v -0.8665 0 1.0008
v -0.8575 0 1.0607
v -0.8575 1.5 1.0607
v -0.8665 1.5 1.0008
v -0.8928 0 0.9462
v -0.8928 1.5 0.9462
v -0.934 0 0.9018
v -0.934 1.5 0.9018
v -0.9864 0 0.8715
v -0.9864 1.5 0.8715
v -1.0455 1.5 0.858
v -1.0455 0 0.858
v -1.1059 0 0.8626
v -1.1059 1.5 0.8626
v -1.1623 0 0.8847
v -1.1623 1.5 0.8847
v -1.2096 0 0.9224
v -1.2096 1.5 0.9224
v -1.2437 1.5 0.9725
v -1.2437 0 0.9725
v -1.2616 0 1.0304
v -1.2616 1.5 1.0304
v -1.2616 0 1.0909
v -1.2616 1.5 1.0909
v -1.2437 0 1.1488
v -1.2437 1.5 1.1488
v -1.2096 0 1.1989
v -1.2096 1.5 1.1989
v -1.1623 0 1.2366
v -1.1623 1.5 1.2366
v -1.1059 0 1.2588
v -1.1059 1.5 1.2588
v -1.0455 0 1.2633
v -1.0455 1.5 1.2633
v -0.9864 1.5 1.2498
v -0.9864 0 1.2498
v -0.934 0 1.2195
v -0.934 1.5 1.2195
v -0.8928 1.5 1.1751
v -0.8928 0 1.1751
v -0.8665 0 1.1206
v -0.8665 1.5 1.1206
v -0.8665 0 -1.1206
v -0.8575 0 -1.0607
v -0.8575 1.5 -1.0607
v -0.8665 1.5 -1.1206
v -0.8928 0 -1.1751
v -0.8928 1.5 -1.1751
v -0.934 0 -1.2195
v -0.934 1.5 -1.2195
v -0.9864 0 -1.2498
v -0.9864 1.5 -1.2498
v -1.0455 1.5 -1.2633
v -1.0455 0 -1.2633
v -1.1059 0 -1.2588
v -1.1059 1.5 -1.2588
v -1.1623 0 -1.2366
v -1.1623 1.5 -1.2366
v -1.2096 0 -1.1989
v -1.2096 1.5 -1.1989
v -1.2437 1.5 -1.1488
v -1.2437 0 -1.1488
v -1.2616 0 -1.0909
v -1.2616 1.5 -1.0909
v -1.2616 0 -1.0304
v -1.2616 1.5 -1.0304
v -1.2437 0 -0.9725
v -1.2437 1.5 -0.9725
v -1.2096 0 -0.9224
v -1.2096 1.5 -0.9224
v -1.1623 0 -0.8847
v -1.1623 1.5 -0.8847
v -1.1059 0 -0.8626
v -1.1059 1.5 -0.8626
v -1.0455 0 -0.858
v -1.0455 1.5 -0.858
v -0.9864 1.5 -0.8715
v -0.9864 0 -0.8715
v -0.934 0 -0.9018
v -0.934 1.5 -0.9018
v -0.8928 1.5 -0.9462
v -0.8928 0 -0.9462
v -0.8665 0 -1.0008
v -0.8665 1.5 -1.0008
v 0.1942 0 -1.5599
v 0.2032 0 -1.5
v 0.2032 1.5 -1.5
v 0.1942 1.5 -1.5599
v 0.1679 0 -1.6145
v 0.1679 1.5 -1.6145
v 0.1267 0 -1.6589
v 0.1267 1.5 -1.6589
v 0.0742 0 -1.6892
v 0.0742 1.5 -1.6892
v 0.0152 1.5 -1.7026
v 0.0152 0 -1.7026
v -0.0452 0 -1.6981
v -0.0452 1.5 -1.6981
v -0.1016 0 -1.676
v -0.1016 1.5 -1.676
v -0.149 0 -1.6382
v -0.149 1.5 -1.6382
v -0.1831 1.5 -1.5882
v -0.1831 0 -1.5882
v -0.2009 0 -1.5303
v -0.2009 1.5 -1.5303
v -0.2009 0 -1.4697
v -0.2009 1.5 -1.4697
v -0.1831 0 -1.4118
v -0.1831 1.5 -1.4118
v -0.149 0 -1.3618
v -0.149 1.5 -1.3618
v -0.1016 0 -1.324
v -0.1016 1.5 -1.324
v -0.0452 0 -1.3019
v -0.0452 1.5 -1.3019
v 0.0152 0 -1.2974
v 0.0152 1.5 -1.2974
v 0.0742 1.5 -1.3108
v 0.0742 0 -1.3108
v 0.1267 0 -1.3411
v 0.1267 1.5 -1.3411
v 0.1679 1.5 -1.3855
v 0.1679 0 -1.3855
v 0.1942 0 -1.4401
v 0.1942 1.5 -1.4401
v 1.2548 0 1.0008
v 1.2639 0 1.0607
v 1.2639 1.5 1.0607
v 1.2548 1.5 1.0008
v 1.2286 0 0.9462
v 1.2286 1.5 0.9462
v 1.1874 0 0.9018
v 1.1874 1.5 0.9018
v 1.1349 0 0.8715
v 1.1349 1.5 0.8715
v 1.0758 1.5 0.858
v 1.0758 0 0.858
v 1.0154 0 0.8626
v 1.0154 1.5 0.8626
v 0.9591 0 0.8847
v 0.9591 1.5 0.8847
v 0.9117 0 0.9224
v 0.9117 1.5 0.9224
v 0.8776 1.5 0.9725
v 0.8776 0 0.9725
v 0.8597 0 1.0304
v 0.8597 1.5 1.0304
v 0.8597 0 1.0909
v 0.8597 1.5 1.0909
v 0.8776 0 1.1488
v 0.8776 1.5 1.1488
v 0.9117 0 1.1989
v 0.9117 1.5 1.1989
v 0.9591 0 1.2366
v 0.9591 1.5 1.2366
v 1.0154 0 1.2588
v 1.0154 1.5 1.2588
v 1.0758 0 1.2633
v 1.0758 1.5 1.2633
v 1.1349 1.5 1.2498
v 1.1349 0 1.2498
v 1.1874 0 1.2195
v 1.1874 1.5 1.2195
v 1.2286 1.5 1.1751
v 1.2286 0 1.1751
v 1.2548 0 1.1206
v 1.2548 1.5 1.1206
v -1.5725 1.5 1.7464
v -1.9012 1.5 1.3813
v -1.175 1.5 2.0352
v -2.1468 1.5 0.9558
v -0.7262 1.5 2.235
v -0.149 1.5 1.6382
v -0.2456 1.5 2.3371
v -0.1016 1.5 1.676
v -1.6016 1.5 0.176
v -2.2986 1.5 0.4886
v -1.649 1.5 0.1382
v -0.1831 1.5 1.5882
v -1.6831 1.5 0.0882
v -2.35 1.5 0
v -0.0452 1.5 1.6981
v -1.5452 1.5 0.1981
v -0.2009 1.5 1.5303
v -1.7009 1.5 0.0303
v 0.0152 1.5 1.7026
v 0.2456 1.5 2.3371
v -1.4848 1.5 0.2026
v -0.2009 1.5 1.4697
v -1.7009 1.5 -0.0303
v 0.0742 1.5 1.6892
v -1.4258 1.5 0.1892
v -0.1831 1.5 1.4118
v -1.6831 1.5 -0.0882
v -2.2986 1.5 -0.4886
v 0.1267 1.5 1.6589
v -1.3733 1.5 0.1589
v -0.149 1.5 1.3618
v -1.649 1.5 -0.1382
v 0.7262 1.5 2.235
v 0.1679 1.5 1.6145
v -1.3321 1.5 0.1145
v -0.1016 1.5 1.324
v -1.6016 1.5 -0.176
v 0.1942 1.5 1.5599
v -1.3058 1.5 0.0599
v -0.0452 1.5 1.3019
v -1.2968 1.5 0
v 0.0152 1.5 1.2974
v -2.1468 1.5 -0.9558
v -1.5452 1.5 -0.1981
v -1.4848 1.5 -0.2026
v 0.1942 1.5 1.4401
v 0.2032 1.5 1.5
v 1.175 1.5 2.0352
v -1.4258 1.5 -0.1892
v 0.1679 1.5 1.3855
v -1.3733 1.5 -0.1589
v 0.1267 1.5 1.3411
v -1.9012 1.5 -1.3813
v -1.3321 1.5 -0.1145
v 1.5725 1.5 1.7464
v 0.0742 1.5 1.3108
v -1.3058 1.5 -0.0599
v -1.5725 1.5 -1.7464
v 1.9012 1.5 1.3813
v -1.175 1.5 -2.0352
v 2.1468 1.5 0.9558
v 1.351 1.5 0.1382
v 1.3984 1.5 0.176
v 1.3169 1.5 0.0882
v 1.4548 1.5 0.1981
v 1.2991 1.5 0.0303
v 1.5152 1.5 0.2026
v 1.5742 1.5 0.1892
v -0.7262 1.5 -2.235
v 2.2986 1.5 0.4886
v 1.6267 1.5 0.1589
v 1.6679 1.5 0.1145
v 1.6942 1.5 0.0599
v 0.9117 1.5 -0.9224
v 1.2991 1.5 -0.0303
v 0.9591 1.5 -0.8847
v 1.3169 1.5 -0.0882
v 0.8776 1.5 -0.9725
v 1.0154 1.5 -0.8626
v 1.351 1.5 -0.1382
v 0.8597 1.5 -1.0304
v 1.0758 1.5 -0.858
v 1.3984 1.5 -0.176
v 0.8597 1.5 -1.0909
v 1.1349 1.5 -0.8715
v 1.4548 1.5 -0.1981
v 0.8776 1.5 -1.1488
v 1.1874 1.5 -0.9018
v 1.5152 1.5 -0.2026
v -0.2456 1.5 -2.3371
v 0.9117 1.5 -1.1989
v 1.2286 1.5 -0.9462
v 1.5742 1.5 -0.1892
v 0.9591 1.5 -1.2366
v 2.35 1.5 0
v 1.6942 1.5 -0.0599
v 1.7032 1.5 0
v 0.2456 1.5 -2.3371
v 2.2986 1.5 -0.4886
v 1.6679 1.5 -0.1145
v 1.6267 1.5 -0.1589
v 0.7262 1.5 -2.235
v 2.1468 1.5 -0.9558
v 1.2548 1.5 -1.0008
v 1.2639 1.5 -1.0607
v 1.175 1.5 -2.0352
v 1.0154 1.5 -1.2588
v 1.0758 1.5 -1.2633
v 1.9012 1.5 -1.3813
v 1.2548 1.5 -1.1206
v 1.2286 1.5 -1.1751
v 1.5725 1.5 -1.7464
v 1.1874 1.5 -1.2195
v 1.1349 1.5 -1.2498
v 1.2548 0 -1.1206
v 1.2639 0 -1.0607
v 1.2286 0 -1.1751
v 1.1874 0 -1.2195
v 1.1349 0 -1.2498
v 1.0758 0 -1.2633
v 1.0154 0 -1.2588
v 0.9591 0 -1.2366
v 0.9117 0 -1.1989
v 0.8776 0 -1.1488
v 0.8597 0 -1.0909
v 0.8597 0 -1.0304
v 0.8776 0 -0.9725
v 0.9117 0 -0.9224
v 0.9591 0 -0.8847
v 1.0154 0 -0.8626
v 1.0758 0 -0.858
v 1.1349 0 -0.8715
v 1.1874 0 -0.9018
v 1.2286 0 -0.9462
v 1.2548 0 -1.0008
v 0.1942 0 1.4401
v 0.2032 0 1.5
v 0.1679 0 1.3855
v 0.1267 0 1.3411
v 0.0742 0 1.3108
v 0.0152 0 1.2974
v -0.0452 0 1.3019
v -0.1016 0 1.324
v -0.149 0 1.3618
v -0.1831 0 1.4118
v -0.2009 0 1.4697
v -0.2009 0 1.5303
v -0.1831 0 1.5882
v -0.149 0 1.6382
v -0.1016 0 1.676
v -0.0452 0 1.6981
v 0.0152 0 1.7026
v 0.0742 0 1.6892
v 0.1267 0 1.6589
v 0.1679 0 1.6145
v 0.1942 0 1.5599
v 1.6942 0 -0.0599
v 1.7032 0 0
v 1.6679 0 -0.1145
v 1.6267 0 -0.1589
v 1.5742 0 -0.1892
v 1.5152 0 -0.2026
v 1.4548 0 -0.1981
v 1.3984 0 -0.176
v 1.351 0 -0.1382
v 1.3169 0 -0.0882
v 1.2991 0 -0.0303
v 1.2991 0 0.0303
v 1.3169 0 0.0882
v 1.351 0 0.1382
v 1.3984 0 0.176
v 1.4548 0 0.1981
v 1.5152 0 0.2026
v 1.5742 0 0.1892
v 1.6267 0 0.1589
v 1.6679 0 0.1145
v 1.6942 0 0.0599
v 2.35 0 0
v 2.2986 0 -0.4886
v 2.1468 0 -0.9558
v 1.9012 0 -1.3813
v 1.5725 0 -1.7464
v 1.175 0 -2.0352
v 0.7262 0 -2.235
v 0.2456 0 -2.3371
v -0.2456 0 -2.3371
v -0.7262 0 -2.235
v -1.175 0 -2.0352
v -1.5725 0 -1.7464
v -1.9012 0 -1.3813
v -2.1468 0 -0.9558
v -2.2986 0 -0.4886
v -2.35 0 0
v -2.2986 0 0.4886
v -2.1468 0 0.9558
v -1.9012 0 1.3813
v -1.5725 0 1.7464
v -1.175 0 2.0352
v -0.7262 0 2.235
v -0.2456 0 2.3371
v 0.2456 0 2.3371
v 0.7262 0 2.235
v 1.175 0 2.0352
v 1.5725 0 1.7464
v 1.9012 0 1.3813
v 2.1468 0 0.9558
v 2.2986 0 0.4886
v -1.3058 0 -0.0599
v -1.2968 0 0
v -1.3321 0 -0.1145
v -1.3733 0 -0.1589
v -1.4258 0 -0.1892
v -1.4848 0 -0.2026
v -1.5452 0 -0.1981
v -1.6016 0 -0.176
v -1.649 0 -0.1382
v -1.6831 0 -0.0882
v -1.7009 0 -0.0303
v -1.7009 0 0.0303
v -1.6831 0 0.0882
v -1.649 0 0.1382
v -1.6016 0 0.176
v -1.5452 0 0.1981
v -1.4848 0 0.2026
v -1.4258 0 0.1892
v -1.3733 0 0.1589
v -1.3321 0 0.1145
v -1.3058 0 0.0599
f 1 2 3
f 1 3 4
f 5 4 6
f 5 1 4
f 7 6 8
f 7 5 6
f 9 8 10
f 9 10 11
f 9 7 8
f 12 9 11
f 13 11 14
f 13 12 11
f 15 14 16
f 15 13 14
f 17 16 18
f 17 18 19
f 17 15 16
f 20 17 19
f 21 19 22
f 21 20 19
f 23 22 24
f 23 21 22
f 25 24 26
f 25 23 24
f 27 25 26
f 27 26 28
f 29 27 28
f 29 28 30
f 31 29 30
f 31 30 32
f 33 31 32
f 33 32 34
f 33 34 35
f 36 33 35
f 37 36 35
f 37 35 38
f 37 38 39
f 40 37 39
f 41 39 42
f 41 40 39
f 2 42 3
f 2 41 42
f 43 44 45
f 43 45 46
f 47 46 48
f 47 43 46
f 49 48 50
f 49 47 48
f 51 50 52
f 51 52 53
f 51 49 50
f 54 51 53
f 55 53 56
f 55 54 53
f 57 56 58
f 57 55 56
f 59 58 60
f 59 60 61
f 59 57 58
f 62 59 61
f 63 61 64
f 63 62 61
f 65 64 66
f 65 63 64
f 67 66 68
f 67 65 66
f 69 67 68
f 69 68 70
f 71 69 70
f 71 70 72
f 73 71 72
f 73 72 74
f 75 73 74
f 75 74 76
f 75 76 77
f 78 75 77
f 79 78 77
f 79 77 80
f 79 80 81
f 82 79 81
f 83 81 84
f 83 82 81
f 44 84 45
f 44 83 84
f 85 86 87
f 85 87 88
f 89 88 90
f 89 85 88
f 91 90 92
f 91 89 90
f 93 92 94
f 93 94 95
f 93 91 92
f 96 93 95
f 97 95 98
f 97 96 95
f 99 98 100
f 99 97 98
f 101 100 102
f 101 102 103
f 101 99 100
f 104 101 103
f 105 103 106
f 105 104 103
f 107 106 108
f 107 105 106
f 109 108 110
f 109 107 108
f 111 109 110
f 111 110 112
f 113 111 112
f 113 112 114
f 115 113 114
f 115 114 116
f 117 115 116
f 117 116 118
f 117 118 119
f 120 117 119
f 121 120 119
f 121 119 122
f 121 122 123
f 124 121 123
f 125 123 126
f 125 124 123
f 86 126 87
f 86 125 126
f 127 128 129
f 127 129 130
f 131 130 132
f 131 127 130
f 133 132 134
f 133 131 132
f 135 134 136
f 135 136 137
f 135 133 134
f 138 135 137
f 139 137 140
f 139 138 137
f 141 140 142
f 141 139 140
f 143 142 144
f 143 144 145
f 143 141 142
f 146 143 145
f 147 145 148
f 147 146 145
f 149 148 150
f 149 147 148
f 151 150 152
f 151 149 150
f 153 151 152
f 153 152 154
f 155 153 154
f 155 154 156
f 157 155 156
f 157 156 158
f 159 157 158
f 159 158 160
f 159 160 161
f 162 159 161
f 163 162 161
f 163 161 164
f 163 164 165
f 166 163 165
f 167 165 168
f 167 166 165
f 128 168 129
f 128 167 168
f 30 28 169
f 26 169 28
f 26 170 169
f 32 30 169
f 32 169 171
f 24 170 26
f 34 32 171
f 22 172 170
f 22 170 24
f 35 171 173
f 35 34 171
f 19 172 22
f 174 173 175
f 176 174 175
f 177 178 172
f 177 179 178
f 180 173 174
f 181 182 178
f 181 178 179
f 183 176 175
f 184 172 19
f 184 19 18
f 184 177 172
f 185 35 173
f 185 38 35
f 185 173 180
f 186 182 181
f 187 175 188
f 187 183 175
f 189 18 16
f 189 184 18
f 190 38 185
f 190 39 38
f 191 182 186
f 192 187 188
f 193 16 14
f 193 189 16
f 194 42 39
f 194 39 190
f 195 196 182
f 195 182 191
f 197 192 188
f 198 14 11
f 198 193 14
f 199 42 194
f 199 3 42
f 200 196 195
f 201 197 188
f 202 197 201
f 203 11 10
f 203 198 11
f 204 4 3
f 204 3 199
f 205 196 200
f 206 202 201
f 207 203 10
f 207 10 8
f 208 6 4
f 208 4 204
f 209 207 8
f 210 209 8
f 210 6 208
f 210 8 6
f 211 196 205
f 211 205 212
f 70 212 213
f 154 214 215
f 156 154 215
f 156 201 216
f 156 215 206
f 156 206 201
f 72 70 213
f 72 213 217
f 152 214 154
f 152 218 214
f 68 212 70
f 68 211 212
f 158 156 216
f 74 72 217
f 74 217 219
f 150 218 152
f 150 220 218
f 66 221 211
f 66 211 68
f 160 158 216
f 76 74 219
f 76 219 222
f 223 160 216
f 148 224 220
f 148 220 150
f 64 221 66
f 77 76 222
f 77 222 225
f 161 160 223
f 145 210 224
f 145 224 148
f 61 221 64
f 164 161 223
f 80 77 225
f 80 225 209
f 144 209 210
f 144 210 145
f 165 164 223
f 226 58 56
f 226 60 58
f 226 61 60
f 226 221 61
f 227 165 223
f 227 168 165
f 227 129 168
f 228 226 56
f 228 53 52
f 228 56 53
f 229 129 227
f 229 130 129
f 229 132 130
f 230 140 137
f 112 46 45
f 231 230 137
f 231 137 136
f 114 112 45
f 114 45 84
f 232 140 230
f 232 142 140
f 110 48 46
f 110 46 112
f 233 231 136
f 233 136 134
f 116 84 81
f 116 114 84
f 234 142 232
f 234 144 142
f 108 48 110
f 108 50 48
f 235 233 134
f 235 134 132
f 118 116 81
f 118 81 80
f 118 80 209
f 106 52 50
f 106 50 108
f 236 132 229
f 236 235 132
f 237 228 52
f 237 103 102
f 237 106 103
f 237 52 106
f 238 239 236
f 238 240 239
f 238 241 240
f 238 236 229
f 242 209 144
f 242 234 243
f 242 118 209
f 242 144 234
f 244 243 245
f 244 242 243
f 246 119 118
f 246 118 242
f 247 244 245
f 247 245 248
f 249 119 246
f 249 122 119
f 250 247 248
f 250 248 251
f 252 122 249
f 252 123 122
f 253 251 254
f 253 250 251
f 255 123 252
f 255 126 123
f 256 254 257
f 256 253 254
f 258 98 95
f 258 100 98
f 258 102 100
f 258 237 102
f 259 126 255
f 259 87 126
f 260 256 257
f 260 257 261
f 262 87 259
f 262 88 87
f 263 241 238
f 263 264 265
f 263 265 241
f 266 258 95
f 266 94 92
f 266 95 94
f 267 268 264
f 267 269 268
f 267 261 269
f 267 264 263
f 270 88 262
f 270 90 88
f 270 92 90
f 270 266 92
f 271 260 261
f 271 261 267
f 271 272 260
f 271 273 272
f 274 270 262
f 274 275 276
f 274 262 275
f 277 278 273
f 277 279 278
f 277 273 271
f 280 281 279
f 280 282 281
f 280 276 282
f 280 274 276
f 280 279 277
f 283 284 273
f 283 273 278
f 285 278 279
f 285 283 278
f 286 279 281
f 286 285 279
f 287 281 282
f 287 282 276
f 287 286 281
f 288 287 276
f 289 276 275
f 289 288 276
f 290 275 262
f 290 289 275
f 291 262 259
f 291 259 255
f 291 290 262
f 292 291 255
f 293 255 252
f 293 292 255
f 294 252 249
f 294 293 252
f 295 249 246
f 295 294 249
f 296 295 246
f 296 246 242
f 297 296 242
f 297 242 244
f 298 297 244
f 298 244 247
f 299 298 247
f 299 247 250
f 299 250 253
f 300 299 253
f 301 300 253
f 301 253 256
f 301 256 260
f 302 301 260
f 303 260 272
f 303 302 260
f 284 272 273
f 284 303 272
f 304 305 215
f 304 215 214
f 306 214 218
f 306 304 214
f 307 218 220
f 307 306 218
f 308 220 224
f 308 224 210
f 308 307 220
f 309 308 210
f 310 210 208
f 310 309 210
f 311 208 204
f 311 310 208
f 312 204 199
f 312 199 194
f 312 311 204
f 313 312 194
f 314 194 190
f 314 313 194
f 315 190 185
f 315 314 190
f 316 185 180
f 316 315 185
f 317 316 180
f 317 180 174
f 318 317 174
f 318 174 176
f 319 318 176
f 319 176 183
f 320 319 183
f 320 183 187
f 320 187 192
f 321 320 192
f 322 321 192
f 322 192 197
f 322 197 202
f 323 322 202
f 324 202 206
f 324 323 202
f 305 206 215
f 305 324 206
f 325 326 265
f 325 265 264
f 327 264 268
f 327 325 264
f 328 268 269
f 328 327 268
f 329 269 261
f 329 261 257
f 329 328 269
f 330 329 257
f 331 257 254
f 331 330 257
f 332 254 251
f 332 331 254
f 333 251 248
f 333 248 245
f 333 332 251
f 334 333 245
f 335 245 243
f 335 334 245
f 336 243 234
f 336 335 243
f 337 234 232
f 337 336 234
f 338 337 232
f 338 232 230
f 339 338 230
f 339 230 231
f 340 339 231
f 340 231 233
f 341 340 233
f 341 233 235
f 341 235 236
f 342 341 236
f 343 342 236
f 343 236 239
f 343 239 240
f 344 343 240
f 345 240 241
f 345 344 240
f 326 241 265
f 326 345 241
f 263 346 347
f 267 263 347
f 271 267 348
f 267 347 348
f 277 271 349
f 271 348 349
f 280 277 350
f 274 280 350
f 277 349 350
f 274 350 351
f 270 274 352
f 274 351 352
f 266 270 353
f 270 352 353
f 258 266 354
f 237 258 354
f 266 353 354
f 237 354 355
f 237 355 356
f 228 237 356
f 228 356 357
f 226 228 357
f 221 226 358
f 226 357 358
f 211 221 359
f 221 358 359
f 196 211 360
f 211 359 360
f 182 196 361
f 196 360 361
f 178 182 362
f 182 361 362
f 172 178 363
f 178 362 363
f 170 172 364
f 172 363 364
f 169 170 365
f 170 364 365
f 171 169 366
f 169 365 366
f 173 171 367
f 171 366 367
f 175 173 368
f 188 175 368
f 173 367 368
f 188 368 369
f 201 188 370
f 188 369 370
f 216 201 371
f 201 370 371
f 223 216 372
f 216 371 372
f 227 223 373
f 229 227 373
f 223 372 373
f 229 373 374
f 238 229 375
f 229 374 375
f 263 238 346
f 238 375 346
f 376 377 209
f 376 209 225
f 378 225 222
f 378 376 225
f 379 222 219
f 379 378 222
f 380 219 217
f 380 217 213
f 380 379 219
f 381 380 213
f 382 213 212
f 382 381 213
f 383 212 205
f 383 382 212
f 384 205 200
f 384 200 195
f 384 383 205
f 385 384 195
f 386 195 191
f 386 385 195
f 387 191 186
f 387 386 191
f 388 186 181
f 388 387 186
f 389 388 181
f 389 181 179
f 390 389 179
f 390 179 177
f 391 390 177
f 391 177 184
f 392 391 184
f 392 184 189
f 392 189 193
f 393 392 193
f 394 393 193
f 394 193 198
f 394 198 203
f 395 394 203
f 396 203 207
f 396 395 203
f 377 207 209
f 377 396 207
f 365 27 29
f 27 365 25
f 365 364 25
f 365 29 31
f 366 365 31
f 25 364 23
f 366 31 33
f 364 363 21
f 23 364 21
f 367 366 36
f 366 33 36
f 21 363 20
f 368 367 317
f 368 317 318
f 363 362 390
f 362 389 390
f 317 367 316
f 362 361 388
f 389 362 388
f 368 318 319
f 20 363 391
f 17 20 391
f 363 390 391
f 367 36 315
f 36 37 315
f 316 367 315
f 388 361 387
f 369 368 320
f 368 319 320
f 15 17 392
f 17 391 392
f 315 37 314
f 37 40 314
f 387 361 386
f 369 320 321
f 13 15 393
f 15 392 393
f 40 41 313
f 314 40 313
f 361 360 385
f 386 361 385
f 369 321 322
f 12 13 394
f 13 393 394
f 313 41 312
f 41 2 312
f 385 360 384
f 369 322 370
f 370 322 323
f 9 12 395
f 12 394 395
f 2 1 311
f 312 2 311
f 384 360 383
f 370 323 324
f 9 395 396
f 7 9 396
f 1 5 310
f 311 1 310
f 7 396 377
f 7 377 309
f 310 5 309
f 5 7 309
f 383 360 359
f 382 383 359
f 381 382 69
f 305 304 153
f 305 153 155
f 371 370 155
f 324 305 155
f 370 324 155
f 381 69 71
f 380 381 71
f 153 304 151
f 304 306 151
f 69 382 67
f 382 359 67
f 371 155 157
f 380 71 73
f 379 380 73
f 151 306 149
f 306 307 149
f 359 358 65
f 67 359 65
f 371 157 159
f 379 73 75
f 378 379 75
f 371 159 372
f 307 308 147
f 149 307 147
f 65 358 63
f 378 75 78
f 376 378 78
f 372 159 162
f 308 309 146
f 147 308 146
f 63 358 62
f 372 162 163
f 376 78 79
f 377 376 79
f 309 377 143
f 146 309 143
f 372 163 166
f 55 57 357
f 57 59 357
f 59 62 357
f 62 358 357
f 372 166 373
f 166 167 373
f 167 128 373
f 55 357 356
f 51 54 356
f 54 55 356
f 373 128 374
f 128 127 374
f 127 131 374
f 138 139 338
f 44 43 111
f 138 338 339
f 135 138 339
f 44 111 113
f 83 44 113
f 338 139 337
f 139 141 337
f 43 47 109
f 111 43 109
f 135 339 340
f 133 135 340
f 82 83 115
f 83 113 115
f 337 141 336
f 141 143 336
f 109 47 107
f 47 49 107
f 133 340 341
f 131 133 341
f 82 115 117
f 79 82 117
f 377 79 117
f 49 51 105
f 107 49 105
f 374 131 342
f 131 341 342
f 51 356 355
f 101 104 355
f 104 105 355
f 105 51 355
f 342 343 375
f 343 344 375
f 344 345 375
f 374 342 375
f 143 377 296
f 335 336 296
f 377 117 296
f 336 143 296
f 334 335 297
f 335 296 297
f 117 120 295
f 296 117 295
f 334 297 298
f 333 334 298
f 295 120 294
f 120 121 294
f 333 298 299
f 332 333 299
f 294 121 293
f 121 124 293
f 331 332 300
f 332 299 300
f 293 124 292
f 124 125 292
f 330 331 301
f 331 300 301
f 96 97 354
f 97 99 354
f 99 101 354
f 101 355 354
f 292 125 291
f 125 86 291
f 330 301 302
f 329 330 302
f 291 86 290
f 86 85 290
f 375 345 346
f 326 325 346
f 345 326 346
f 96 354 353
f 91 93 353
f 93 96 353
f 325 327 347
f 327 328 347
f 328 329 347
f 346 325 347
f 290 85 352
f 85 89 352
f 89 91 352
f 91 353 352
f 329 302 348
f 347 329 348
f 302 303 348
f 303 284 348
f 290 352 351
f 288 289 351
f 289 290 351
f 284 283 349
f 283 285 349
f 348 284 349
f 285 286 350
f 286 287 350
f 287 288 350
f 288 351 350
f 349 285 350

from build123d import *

# Parameters (mm, degrees)
SKETCH1_R           = 2.35
SKETCH1_R_2         = 0.2032
BOSS_EXTRUDE1_DEPTH = 1.5


with BuildPart() as part:
    # Sketch1 → Boss-Extrude1 (new body)
    with BuildSketch(Plane(origin=(0, 0, 0), x_dir=(1, 0, 0), z_dir=(0, 1, 0))):
        Circle(SKETCH1_R)
        with Locations((0, 1.5)):
            Circle(SKETCH1_R_2, mode=Mode.SUBTRACT)
        with Locations((1.060660172, 1.060660172)):
            Circle(SKETCH1_R_2, mode=Mode.SUBTRACT)
        with Locations((1.5, 0)):
            Circle(SKETCH1_R_2, mode=Mode.SUBTRACT)
        with Locations((1.060660172, -1.060660172)):
            Circle(SKETCH1_R_2, mode=Mode.SUBTRACT)
        with Locations((0, -1.5)):
            Circle(SKETCH1_R_2, mode=Mode.SUBTRACT)
        with Locations((-1.060660172, -1.060660172)):
            Circle(SKETCH1_R_2, mode=Mode.SUBTRACT)
        with Locations((-1.5, 0)):
            Circle(SKETCH1_R_2, mode=Mode.SUBTRACT)
        with Locations((-1.060660172, 1.060660172)):
            Circle(SKETCH1_R_2, mode=Mode.SUBTRACT)
    extrude(amount=BOSS_EXTRUDE1_DEPTH)


solid = part.part
